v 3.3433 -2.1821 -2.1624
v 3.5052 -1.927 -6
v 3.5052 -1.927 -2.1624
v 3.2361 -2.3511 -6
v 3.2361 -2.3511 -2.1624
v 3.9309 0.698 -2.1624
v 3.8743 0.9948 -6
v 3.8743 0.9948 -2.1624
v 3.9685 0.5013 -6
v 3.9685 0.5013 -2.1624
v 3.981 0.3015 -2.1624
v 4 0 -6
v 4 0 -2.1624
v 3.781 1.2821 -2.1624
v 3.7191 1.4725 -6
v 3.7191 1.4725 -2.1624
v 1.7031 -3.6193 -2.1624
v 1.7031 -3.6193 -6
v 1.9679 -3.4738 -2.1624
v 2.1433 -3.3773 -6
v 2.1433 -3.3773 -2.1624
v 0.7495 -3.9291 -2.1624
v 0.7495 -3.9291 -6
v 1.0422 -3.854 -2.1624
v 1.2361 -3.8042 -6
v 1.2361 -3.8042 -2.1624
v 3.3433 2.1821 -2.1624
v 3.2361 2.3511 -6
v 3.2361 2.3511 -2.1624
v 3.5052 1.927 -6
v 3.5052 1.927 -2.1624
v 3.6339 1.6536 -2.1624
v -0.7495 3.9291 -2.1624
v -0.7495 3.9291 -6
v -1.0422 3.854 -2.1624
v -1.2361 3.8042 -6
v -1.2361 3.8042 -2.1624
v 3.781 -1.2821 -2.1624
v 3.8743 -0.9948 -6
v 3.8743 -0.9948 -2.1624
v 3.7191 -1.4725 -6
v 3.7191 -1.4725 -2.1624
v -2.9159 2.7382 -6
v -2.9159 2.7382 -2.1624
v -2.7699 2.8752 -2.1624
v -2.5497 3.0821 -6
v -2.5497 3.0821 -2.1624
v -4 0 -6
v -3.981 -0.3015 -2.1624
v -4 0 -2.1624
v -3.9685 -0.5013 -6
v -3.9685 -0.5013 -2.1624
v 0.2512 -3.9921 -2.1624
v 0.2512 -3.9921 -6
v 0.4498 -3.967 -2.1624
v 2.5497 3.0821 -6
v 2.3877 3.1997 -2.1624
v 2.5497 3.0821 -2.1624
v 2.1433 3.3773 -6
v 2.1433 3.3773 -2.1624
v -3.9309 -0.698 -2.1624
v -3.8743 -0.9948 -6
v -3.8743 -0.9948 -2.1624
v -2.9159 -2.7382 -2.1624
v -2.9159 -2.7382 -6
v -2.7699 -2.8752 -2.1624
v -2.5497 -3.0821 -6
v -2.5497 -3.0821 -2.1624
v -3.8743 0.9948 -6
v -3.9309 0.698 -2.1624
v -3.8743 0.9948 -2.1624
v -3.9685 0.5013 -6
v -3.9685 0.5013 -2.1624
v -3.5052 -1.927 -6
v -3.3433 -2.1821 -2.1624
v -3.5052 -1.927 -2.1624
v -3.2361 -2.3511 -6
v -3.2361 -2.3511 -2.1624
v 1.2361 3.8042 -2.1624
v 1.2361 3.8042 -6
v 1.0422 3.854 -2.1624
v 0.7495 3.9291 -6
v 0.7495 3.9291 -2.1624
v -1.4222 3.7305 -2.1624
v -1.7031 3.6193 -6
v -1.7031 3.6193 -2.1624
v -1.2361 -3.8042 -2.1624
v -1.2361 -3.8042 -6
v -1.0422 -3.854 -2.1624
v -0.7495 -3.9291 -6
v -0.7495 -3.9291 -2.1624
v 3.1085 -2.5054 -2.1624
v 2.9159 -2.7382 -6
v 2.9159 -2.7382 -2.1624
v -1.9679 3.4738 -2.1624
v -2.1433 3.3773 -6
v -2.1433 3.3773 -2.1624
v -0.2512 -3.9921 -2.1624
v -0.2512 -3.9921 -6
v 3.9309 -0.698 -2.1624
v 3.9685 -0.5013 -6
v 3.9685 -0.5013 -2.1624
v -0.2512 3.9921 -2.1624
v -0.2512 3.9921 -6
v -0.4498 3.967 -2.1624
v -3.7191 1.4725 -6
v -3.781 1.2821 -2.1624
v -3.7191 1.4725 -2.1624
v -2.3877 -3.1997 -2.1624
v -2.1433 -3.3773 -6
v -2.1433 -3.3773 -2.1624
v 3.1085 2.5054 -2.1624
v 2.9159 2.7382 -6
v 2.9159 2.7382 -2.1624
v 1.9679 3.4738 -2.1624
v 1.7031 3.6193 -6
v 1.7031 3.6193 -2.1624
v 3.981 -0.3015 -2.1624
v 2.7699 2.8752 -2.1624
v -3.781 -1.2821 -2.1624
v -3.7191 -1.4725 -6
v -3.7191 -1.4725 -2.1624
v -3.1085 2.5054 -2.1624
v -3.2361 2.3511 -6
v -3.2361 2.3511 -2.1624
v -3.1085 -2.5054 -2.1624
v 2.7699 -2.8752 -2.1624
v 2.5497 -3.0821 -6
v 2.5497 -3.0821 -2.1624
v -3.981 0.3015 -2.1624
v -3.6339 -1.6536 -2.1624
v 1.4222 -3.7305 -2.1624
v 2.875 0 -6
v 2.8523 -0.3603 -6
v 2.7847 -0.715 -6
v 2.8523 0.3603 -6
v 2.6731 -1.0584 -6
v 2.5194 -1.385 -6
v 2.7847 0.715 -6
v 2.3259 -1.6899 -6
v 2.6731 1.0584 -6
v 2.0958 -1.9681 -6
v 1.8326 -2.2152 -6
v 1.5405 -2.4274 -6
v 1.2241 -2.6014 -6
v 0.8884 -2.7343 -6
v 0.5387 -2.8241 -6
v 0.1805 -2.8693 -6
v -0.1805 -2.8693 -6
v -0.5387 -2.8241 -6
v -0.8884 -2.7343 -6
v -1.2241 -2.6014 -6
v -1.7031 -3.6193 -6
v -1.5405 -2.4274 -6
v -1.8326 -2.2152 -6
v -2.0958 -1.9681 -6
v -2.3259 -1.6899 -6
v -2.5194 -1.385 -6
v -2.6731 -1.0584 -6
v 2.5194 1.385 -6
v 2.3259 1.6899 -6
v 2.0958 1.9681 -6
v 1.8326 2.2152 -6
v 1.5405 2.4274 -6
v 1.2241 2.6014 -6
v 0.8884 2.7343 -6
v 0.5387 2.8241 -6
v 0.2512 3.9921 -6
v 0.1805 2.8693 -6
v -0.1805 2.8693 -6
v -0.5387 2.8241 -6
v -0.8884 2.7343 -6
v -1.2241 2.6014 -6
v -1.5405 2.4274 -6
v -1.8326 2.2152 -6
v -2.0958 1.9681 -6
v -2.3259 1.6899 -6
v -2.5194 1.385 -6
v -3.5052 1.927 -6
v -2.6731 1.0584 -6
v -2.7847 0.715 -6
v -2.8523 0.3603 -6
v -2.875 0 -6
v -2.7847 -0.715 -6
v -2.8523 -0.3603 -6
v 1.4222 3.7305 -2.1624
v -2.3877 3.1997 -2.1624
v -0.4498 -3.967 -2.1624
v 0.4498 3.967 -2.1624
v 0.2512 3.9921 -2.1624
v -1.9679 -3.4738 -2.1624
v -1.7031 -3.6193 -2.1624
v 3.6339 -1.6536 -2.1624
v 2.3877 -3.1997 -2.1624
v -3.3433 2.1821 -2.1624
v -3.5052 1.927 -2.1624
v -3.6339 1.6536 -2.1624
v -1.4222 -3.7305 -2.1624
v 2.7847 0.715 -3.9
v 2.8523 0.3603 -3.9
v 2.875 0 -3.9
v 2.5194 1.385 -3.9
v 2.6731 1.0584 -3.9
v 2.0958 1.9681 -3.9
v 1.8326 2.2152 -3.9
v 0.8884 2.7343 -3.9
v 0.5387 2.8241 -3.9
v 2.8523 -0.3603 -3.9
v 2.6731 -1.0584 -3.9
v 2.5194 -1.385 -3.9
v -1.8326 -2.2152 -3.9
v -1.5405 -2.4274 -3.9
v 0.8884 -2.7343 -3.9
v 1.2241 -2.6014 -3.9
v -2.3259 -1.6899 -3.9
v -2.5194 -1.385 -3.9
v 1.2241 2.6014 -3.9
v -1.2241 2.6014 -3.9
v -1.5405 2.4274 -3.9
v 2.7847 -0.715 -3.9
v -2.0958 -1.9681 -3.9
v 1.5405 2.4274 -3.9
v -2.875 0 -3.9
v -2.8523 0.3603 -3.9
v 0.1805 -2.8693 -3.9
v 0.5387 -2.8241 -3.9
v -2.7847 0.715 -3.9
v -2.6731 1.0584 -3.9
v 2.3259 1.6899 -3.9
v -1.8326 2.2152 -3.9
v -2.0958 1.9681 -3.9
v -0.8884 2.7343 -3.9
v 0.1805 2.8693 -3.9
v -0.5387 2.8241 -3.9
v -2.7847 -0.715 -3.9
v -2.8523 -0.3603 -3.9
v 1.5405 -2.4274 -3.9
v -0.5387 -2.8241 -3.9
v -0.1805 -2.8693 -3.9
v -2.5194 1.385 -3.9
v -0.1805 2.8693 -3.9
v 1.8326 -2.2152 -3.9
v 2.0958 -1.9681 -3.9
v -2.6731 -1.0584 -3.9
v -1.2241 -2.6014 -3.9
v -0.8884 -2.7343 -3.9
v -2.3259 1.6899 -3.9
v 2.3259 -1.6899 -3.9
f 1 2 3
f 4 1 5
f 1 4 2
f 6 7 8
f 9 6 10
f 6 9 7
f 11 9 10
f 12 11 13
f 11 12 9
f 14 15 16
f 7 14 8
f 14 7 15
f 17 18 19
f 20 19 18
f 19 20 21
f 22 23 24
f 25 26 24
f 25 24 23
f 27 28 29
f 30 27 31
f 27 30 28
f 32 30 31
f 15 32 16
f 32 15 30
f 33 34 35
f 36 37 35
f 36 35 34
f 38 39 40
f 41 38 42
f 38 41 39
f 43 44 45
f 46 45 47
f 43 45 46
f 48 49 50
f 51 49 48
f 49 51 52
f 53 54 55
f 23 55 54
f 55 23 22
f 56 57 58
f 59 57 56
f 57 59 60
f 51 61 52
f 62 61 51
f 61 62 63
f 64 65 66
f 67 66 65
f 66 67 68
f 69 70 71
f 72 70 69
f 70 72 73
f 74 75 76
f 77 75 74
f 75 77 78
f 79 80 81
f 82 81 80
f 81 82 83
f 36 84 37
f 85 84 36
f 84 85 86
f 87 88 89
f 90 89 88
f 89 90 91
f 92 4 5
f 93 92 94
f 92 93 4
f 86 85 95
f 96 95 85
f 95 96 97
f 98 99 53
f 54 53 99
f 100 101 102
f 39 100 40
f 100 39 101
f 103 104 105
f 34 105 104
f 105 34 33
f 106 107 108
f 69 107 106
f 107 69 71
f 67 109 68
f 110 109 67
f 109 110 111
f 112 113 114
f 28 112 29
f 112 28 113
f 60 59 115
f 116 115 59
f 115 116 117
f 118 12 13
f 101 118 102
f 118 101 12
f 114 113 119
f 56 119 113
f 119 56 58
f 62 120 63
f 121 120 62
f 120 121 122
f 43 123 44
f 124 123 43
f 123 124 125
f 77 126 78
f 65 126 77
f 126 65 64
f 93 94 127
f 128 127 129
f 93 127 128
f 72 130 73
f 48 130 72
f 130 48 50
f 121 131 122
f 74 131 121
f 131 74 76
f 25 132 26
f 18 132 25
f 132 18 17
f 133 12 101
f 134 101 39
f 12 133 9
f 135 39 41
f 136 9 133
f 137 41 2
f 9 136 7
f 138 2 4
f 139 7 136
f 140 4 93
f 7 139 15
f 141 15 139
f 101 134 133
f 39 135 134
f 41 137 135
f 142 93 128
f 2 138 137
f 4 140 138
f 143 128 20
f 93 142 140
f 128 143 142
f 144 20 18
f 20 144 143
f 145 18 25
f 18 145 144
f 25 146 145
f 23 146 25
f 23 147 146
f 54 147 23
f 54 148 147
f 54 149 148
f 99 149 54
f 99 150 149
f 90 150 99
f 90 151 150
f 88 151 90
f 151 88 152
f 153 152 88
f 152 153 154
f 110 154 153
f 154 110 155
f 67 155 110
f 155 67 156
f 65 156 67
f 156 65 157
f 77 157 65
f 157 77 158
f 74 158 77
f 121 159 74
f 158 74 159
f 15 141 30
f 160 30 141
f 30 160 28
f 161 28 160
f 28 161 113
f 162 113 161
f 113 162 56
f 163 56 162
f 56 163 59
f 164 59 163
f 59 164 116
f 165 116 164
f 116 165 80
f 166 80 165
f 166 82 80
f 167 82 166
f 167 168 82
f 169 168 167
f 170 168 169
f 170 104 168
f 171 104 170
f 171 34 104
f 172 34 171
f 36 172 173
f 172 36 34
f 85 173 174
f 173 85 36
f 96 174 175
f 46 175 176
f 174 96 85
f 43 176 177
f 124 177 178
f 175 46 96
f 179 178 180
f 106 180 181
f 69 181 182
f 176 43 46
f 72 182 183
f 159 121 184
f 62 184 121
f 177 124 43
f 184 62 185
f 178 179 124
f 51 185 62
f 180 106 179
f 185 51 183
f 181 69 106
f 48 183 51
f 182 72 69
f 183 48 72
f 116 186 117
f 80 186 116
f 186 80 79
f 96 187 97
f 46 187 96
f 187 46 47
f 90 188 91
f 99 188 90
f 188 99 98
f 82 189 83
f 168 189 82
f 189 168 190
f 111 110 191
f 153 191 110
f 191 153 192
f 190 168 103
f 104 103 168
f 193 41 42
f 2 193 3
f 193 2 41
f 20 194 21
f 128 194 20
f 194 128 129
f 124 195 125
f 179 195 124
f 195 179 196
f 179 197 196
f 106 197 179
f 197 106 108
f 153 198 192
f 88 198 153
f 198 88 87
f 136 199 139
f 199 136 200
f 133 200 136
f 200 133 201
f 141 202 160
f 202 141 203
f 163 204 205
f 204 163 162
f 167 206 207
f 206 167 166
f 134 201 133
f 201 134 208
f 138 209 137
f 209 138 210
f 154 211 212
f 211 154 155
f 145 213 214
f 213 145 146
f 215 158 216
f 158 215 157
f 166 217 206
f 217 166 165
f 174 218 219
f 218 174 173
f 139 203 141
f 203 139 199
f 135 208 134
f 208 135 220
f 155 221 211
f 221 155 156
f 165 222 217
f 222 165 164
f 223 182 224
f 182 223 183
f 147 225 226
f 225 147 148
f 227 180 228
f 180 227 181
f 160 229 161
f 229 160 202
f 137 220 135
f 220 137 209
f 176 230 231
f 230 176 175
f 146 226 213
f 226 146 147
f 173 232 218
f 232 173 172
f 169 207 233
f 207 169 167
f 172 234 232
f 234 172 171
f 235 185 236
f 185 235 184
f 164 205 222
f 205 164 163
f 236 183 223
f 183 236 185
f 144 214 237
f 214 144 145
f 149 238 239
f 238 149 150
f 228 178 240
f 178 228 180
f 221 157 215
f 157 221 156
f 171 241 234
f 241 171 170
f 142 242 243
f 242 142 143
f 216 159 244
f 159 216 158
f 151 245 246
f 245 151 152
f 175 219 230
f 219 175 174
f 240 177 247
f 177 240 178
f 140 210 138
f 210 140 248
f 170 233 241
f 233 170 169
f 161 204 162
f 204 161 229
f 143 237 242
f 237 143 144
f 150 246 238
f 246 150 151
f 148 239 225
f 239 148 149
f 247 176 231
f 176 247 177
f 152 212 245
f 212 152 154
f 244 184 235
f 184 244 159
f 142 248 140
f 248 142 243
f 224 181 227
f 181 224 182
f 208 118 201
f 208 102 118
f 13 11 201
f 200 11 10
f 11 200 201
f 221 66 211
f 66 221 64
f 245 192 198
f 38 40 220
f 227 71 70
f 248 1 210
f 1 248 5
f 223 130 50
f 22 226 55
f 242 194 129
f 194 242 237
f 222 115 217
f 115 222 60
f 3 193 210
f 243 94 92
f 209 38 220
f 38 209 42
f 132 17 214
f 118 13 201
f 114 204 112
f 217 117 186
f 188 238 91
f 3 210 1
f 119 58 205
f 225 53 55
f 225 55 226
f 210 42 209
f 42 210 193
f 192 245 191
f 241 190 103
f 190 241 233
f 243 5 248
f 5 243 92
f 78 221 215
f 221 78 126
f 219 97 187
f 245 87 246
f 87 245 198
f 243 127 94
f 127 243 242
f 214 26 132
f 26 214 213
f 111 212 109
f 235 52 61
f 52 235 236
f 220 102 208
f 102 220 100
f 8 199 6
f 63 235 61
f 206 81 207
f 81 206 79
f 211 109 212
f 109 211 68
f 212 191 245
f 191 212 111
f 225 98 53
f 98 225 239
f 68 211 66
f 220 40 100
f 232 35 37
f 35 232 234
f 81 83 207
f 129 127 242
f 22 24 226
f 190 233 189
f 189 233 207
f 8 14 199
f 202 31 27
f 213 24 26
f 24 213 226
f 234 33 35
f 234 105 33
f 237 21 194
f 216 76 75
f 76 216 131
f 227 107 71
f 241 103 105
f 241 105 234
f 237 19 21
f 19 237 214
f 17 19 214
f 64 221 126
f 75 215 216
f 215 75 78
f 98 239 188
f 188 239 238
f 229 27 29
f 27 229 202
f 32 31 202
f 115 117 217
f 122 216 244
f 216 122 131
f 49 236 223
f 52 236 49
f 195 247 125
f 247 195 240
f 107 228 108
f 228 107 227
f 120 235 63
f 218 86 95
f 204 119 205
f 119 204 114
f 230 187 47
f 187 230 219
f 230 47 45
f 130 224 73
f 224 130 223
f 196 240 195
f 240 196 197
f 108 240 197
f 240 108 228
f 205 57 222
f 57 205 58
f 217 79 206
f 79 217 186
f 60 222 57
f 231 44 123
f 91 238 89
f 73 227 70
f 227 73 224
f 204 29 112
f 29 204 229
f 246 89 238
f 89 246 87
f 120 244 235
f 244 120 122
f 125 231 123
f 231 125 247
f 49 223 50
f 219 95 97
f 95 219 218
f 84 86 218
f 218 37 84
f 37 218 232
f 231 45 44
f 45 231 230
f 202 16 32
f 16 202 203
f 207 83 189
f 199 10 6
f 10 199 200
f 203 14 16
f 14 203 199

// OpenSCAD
$fn = 50;

difference() {
	union() {
		translate(v = [0, 0, -6.0]) {
			cylinder(h = 9, r = 4.0);
		}
		#translate(v = [0, 0, -9.0]) {
			cylinder(h = 9, r = 2.875);
		}
	}
	union() {
		translate(v = [0, 0, 0]) {
			rotate(a = [0, 0, 0]) {
				difference() {
					union() {
						translate(v = [0, 0, -9.0]) {
							cylinder(h = 9, r = 2.6);
						}
						translate(v = [0, 0, -3.9]) {
							cylinder(h = 3.9, r1 = 2.875, r2 = 5.4);
						}
						translate(v = [0, 0, -9.0]) {
							cylinder(h = 9, r = 2.875);
						}
						translate(v = [0, 0, -9.0]) {
							cylinder(h = 9, r = 2.6);
						}
					}
					union();
				}
			}
		}
		#cylinder(h = 3, r = 5.0);
	}
}
